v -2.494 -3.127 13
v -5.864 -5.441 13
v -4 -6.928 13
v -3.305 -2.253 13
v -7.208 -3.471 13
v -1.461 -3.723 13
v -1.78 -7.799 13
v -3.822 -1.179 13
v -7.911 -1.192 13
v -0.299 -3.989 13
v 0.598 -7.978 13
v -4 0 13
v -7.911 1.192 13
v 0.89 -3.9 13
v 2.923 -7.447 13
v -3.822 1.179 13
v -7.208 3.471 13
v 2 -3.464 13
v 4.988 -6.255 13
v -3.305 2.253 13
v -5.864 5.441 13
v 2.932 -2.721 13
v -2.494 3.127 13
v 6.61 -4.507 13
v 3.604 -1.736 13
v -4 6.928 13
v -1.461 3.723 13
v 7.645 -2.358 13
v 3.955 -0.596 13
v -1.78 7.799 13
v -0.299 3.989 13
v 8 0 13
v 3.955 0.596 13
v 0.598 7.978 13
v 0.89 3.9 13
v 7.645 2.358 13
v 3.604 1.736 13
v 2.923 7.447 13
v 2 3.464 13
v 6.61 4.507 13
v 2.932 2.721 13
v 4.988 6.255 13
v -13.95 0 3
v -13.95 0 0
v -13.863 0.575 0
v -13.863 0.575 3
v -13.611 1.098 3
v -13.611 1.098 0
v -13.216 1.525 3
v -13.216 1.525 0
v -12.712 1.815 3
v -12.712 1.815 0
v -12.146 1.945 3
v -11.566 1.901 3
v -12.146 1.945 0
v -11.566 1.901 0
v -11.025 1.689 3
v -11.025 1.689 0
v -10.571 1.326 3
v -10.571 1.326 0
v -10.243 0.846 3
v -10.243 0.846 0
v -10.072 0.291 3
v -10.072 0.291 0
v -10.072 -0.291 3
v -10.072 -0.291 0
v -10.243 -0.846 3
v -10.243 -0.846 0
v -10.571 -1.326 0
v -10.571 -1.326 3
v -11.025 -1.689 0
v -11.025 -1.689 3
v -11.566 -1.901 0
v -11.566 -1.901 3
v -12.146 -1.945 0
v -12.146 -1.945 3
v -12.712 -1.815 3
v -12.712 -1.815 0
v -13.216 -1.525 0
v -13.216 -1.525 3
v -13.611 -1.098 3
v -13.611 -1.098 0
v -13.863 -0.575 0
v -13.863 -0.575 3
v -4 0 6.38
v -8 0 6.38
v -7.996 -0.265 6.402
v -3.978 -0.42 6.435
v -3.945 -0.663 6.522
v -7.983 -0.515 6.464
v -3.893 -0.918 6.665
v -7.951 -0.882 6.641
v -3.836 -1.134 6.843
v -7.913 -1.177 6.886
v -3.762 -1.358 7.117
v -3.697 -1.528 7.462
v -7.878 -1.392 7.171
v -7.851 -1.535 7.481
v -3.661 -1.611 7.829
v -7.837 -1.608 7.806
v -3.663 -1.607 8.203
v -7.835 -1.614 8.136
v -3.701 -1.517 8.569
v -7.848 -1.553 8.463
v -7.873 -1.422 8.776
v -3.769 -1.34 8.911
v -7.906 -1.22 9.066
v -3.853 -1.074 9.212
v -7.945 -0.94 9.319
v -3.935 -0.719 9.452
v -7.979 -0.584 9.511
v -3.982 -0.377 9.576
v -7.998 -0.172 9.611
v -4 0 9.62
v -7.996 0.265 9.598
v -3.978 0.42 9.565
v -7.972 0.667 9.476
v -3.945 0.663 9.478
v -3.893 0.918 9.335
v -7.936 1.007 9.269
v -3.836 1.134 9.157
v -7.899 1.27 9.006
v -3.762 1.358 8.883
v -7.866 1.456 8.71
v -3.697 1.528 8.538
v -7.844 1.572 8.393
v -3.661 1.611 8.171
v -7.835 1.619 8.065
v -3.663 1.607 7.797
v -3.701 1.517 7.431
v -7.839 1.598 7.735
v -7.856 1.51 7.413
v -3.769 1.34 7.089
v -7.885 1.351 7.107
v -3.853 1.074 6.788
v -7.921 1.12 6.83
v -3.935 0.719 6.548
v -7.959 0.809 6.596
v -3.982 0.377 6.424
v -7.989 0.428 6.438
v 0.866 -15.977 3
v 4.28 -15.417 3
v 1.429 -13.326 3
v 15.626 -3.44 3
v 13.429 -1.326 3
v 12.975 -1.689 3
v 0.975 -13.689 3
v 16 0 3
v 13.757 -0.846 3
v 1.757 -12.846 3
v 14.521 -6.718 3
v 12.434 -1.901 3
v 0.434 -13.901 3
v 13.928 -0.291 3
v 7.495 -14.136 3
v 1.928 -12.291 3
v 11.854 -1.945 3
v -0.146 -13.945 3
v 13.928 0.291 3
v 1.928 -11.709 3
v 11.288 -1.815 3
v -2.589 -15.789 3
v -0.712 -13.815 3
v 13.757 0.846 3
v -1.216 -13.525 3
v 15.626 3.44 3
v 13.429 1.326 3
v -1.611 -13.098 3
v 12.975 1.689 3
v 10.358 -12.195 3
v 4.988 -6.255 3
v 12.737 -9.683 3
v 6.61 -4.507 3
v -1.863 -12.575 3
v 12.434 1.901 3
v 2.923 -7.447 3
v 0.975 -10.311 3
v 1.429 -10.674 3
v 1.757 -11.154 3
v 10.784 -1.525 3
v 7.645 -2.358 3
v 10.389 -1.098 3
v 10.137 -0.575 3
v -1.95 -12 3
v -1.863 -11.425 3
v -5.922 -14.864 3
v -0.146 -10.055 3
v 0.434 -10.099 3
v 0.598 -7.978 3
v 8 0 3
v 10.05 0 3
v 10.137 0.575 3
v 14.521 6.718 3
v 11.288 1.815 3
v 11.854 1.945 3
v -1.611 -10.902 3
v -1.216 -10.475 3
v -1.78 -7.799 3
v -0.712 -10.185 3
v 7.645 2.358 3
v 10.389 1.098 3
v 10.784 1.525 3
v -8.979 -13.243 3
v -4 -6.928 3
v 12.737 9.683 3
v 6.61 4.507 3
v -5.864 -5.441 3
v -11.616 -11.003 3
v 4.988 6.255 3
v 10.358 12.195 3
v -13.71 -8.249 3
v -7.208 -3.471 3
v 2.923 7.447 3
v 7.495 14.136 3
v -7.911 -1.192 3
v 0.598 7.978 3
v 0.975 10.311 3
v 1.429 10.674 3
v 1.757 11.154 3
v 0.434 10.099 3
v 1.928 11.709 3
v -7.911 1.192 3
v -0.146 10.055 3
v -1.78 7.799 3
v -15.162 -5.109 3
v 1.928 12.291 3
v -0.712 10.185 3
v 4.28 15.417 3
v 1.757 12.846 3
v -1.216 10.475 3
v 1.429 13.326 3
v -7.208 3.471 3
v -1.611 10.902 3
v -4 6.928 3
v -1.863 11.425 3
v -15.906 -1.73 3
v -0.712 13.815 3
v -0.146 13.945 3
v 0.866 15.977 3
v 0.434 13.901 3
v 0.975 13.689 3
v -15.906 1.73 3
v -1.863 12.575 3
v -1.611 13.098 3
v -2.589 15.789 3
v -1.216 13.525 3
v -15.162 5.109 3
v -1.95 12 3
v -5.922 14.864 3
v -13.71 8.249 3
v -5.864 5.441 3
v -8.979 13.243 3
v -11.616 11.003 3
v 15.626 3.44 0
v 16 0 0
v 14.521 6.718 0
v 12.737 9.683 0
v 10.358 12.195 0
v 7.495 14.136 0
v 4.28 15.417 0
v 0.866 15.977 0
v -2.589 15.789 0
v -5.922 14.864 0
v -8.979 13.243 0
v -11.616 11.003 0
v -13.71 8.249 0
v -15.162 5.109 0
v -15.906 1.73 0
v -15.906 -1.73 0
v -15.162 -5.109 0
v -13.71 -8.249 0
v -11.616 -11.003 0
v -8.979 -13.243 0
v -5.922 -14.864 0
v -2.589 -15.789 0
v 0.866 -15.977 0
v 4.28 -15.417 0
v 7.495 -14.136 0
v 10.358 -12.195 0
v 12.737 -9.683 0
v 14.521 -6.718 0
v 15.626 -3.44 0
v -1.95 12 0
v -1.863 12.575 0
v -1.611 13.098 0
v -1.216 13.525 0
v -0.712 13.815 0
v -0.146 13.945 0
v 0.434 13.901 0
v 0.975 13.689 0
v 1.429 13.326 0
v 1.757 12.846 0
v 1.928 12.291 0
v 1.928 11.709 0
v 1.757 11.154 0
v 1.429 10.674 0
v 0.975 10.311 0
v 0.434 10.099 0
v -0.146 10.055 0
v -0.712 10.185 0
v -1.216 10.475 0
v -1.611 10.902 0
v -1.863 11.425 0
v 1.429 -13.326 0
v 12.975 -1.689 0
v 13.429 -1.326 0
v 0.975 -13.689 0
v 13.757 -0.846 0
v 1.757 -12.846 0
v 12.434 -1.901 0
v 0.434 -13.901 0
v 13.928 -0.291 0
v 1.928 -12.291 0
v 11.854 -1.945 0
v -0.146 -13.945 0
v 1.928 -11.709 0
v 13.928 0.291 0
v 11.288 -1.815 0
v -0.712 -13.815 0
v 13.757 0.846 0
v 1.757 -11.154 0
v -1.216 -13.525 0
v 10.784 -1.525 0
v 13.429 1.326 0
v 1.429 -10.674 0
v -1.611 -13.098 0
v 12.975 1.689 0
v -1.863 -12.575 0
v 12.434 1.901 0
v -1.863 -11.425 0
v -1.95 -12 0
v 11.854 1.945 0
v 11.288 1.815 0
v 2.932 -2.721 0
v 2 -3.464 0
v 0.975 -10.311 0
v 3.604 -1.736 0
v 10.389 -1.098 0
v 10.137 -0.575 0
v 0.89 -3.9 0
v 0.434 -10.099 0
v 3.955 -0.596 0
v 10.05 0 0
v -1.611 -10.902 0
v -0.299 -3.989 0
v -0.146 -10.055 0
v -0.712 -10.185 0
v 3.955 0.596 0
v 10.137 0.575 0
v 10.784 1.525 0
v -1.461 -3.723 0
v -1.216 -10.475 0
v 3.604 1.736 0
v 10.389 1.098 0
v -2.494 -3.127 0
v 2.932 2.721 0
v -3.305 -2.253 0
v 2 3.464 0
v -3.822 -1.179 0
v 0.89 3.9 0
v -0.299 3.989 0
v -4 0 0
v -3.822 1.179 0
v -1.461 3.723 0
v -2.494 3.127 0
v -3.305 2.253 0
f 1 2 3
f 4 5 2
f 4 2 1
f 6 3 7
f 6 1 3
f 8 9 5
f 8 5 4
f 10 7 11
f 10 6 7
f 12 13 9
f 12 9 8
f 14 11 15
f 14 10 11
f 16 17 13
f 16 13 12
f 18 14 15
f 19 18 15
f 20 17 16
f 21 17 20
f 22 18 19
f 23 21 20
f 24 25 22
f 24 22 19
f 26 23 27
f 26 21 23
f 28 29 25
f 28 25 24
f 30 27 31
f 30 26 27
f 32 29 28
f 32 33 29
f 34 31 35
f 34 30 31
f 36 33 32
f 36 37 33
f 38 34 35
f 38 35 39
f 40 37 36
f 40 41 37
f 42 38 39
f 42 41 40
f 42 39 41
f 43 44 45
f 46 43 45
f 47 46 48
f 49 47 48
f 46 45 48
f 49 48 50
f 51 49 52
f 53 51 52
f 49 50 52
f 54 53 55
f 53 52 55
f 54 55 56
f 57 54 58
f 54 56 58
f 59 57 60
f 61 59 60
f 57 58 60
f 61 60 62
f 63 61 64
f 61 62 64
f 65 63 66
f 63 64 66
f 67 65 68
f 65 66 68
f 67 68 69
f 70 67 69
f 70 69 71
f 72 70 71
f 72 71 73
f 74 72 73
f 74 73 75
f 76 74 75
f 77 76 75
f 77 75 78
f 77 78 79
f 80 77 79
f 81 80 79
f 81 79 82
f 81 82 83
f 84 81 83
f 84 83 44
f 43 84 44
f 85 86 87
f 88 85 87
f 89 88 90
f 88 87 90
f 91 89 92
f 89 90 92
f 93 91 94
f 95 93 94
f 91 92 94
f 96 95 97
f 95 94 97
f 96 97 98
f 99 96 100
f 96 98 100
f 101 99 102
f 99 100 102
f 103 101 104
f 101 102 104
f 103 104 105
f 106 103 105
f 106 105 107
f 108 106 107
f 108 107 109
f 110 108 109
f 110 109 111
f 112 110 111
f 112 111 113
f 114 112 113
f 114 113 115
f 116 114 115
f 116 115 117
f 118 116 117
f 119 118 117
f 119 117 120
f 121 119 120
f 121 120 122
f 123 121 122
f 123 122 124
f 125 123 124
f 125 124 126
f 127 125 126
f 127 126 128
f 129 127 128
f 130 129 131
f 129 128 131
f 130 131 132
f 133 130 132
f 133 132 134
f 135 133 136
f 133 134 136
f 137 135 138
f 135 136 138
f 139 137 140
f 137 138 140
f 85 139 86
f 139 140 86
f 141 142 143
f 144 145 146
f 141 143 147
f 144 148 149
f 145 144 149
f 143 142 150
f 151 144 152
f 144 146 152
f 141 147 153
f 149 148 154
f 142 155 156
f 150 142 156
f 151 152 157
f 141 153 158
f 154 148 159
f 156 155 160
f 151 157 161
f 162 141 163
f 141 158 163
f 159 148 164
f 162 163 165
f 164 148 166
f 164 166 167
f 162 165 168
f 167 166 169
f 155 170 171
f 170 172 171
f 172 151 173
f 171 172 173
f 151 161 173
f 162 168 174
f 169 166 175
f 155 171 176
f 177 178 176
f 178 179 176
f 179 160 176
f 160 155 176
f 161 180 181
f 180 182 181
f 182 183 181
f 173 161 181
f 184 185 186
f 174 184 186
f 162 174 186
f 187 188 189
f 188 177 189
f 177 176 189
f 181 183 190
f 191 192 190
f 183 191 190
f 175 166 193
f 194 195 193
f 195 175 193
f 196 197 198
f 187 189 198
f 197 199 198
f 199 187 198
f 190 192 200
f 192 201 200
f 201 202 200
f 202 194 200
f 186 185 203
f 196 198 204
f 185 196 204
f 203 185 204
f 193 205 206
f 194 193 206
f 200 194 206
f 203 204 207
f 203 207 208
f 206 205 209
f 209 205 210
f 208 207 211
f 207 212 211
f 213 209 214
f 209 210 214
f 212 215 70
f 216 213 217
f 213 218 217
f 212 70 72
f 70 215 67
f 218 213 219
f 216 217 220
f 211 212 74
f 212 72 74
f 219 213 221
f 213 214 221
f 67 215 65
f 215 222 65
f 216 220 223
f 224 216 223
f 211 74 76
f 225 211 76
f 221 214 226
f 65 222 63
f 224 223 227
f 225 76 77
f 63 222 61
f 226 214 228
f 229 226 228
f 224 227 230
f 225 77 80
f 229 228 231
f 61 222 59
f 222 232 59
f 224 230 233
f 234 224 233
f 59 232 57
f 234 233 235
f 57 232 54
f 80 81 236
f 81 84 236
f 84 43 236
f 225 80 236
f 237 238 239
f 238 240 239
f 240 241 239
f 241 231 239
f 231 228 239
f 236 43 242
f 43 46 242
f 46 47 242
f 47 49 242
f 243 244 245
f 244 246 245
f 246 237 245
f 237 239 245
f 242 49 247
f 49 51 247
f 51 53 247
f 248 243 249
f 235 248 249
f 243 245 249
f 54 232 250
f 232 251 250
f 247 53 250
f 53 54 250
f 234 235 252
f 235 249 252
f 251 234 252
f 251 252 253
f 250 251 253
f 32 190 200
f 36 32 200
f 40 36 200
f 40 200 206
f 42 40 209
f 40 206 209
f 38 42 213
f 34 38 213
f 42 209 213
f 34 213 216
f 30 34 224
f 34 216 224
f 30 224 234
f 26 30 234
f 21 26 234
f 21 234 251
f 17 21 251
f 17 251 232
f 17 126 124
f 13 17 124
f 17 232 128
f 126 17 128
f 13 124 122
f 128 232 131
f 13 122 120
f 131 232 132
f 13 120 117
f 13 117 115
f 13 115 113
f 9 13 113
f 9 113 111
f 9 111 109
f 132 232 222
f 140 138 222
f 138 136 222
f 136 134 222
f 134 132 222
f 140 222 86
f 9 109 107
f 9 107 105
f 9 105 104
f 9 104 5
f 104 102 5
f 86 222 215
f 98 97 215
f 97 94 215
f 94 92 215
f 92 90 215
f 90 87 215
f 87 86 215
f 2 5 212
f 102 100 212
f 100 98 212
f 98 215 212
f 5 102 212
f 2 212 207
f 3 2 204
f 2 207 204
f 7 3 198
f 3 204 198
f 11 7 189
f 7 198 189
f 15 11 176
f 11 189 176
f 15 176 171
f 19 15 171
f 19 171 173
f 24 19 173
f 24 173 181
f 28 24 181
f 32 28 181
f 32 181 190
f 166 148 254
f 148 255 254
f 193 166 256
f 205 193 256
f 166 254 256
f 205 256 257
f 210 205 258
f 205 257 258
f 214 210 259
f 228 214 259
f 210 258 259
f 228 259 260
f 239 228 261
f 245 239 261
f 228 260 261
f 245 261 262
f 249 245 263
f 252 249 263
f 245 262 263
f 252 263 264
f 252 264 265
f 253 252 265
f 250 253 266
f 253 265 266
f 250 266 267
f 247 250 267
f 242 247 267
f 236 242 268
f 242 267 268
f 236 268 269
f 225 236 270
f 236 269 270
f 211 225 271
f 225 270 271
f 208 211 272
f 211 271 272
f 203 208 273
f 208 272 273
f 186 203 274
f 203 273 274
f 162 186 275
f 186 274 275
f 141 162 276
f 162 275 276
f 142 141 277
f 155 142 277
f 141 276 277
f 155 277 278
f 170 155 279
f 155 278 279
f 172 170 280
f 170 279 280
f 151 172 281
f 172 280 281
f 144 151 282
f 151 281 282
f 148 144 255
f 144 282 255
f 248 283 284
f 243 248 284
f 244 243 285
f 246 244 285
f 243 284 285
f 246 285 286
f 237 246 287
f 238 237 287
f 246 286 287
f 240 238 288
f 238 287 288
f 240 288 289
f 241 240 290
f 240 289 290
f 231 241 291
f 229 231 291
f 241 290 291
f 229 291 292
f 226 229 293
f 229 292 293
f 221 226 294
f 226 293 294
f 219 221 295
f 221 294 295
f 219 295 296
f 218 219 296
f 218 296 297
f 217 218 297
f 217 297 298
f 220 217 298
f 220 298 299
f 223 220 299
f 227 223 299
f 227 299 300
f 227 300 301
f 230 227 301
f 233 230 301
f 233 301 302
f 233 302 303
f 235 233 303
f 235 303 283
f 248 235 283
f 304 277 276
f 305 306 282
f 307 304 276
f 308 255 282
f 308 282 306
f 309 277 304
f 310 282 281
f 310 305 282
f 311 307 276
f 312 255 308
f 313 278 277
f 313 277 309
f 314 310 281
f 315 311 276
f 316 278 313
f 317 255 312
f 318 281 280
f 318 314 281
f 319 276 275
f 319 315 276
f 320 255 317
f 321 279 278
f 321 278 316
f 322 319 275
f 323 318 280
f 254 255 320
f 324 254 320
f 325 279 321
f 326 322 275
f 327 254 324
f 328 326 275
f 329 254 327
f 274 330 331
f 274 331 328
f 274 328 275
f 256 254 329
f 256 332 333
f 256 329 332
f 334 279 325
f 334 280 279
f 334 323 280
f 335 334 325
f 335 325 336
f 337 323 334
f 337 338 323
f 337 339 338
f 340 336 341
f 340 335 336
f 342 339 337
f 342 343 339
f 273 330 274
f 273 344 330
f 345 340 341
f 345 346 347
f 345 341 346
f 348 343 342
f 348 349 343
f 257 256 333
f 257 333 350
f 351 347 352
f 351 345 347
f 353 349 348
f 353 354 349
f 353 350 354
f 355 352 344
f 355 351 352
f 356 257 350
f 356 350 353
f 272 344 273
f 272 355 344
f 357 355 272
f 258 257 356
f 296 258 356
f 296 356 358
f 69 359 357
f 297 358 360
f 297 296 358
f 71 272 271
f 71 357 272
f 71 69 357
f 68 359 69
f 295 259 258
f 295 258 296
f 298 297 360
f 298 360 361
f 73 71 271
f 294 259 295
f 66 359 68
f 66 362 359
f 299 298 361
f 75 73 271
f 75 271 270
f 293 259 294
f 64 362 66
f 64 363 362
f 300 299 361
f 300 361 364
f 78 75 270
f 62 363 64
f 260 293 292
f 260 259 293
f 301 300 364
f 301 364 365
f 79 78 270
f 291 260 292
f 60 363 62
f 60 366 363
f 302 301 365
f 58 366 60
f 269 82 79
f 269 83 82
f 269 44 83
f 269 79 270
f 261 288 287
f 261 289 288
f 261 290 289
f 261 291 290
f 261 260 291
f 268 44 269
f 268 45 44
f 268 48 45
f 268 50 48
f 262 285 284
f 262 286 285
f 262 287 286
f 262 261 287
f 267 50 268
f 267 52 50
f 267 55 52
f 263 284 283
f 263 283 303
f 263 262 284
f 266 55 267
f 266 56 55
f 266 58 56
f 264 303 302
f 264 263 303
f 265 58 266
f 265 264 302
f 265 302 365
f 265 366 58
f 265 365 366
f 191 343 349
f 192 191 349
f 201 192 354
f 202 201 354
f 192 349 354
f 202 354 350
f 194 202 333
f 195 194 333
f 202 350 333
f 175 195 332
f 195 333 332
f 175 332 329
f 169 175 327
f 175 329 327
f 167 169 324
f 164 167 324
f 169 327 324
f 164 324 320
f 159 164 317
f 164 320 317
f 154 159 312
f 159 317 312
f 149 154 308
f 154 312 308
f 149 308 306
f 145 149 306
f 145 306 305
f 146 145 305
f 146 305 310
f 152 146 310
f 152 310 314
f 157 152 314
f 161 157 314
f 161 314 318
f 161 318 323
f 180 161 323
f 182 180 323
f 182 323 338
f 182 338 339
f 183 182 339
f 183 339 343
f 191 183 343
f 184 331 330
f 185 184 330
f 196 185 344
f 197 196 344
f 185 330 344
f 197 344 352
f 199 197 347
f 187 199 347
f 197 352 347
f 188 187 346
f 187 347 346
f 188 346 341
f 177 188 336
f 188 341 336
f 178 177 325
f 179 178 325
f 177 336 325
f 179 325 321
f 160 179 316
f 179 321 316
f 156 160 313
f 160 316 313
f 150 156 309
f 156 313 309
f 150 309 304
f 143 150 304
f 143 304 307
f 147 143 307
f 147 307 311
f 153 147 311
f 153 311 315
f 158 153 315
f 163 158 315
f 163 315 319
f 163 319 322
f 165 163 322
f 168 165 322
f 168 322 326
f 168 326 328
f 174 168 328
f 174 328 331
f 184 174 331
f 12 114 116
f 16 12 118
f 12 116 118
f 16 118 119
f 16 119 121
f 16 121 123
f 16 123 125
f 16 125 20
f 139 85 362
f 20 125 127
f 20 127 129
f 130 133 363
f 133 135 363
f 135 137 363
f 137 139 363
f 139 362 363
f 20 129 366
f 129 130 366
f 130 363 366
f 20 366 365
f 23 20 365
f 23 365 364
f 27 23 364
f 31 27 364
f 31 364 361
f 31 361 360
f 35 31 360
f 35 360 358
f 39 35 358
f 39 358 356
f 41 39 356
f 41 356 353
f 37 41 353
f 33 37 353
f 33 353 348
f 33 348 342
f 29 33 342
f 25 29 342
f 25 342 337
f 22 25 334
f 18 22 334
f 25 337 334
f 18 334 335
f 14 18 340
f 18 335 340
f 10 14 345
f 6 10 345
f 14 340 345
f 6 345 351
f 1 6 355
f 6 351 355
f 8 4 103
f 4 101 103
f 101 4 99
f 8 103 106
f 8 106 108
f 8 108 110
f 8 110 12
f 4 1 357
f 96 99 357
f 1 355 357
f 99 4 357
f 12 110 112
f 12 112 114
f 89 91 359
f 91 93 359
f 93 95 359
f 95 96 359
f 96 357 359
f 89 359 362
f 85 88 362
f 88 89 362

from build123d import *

# Parameters (mm, degrees)
SCHIZZO1_W                   = 16
SCHIZZO1_H                   = 3
SCHIZZO2_R                   = 8
ESTRUSIONE_ESTRUSIONE1_DEPTH = 10
FORO_3_9_3_9_1_D             = 3.9
FORO_8_0_8_1_D               = 8
FORO_PER_VITE_M3_1_REACH     = 31.933
FORO_PER_VITE_M3_1_BORE_R    = 1.62


with BuildPart() as part:
    # Schizzo1 → Rivoluzione1 (revolve)
    with BuildSketch(Plane(origin=(0, 0, 0), x_dir=(1, 0, 0), z_dir=(0, 1, 0))):
        with Locations((8, -1.5)):
            Rectangle(SCHIZZO1_W, SCHIZZO1_H)
    revolve(axis=Axis((0, 0, 0), (0, 0, 1)))

    # Schizzo2 → Estrusione-Estrusione1 (add)
    with BuildSketch(Plane.XY.offset(3)):
        Circle(SCHIZZO2_R)
    extrude(amount=ESTRUSIONE_ESTRUSIONE1_DEPTH)

    # Foro Ø3.9 (3.9)-1 (through all)
    with Locations(Plane.XY.offset(3)):
        with Locations((12, 0), (0, 12), (-12, 0), (0, -12)):
            Hole(FORO_3_9_3_9_1_D / 2)

    # Foro Ø8.0 (8)-1 (through all)
    with Locations(Plane.XY.offset(13)):
        with Locations((0, 0)):
            Hole(FORO_8_0_8_1_D / 2)

    # Foro per Vite M3-1 bore (on position points) → Foro per Vite M3-1 (cut, up to next)
    with BuildSketch(Plane(origin=(-8, 0, 8), x_dir=(0, 0, -1), z_dir=(-1, 0, 0)), mode=Mode.PRIVATE) as foro_per_vite_m3_1_sk1:
        Circle(FORO_PER_VITE_M3_1_BORE_R)
    foro_per_vite_m3_1_tool1 = extrude(foro_per_vite_m3_1_sk1.sketch, amount=-FORO_PER_VITE_M3_1_REACH, mode=Mode.PRIVATE) & part.part
    add(foro_per_vite_m3_1_tool1.solids().sort_by_distance((-8, 0, 8))[0], mode=Mode.SUBTRACT)


solid = part.part
